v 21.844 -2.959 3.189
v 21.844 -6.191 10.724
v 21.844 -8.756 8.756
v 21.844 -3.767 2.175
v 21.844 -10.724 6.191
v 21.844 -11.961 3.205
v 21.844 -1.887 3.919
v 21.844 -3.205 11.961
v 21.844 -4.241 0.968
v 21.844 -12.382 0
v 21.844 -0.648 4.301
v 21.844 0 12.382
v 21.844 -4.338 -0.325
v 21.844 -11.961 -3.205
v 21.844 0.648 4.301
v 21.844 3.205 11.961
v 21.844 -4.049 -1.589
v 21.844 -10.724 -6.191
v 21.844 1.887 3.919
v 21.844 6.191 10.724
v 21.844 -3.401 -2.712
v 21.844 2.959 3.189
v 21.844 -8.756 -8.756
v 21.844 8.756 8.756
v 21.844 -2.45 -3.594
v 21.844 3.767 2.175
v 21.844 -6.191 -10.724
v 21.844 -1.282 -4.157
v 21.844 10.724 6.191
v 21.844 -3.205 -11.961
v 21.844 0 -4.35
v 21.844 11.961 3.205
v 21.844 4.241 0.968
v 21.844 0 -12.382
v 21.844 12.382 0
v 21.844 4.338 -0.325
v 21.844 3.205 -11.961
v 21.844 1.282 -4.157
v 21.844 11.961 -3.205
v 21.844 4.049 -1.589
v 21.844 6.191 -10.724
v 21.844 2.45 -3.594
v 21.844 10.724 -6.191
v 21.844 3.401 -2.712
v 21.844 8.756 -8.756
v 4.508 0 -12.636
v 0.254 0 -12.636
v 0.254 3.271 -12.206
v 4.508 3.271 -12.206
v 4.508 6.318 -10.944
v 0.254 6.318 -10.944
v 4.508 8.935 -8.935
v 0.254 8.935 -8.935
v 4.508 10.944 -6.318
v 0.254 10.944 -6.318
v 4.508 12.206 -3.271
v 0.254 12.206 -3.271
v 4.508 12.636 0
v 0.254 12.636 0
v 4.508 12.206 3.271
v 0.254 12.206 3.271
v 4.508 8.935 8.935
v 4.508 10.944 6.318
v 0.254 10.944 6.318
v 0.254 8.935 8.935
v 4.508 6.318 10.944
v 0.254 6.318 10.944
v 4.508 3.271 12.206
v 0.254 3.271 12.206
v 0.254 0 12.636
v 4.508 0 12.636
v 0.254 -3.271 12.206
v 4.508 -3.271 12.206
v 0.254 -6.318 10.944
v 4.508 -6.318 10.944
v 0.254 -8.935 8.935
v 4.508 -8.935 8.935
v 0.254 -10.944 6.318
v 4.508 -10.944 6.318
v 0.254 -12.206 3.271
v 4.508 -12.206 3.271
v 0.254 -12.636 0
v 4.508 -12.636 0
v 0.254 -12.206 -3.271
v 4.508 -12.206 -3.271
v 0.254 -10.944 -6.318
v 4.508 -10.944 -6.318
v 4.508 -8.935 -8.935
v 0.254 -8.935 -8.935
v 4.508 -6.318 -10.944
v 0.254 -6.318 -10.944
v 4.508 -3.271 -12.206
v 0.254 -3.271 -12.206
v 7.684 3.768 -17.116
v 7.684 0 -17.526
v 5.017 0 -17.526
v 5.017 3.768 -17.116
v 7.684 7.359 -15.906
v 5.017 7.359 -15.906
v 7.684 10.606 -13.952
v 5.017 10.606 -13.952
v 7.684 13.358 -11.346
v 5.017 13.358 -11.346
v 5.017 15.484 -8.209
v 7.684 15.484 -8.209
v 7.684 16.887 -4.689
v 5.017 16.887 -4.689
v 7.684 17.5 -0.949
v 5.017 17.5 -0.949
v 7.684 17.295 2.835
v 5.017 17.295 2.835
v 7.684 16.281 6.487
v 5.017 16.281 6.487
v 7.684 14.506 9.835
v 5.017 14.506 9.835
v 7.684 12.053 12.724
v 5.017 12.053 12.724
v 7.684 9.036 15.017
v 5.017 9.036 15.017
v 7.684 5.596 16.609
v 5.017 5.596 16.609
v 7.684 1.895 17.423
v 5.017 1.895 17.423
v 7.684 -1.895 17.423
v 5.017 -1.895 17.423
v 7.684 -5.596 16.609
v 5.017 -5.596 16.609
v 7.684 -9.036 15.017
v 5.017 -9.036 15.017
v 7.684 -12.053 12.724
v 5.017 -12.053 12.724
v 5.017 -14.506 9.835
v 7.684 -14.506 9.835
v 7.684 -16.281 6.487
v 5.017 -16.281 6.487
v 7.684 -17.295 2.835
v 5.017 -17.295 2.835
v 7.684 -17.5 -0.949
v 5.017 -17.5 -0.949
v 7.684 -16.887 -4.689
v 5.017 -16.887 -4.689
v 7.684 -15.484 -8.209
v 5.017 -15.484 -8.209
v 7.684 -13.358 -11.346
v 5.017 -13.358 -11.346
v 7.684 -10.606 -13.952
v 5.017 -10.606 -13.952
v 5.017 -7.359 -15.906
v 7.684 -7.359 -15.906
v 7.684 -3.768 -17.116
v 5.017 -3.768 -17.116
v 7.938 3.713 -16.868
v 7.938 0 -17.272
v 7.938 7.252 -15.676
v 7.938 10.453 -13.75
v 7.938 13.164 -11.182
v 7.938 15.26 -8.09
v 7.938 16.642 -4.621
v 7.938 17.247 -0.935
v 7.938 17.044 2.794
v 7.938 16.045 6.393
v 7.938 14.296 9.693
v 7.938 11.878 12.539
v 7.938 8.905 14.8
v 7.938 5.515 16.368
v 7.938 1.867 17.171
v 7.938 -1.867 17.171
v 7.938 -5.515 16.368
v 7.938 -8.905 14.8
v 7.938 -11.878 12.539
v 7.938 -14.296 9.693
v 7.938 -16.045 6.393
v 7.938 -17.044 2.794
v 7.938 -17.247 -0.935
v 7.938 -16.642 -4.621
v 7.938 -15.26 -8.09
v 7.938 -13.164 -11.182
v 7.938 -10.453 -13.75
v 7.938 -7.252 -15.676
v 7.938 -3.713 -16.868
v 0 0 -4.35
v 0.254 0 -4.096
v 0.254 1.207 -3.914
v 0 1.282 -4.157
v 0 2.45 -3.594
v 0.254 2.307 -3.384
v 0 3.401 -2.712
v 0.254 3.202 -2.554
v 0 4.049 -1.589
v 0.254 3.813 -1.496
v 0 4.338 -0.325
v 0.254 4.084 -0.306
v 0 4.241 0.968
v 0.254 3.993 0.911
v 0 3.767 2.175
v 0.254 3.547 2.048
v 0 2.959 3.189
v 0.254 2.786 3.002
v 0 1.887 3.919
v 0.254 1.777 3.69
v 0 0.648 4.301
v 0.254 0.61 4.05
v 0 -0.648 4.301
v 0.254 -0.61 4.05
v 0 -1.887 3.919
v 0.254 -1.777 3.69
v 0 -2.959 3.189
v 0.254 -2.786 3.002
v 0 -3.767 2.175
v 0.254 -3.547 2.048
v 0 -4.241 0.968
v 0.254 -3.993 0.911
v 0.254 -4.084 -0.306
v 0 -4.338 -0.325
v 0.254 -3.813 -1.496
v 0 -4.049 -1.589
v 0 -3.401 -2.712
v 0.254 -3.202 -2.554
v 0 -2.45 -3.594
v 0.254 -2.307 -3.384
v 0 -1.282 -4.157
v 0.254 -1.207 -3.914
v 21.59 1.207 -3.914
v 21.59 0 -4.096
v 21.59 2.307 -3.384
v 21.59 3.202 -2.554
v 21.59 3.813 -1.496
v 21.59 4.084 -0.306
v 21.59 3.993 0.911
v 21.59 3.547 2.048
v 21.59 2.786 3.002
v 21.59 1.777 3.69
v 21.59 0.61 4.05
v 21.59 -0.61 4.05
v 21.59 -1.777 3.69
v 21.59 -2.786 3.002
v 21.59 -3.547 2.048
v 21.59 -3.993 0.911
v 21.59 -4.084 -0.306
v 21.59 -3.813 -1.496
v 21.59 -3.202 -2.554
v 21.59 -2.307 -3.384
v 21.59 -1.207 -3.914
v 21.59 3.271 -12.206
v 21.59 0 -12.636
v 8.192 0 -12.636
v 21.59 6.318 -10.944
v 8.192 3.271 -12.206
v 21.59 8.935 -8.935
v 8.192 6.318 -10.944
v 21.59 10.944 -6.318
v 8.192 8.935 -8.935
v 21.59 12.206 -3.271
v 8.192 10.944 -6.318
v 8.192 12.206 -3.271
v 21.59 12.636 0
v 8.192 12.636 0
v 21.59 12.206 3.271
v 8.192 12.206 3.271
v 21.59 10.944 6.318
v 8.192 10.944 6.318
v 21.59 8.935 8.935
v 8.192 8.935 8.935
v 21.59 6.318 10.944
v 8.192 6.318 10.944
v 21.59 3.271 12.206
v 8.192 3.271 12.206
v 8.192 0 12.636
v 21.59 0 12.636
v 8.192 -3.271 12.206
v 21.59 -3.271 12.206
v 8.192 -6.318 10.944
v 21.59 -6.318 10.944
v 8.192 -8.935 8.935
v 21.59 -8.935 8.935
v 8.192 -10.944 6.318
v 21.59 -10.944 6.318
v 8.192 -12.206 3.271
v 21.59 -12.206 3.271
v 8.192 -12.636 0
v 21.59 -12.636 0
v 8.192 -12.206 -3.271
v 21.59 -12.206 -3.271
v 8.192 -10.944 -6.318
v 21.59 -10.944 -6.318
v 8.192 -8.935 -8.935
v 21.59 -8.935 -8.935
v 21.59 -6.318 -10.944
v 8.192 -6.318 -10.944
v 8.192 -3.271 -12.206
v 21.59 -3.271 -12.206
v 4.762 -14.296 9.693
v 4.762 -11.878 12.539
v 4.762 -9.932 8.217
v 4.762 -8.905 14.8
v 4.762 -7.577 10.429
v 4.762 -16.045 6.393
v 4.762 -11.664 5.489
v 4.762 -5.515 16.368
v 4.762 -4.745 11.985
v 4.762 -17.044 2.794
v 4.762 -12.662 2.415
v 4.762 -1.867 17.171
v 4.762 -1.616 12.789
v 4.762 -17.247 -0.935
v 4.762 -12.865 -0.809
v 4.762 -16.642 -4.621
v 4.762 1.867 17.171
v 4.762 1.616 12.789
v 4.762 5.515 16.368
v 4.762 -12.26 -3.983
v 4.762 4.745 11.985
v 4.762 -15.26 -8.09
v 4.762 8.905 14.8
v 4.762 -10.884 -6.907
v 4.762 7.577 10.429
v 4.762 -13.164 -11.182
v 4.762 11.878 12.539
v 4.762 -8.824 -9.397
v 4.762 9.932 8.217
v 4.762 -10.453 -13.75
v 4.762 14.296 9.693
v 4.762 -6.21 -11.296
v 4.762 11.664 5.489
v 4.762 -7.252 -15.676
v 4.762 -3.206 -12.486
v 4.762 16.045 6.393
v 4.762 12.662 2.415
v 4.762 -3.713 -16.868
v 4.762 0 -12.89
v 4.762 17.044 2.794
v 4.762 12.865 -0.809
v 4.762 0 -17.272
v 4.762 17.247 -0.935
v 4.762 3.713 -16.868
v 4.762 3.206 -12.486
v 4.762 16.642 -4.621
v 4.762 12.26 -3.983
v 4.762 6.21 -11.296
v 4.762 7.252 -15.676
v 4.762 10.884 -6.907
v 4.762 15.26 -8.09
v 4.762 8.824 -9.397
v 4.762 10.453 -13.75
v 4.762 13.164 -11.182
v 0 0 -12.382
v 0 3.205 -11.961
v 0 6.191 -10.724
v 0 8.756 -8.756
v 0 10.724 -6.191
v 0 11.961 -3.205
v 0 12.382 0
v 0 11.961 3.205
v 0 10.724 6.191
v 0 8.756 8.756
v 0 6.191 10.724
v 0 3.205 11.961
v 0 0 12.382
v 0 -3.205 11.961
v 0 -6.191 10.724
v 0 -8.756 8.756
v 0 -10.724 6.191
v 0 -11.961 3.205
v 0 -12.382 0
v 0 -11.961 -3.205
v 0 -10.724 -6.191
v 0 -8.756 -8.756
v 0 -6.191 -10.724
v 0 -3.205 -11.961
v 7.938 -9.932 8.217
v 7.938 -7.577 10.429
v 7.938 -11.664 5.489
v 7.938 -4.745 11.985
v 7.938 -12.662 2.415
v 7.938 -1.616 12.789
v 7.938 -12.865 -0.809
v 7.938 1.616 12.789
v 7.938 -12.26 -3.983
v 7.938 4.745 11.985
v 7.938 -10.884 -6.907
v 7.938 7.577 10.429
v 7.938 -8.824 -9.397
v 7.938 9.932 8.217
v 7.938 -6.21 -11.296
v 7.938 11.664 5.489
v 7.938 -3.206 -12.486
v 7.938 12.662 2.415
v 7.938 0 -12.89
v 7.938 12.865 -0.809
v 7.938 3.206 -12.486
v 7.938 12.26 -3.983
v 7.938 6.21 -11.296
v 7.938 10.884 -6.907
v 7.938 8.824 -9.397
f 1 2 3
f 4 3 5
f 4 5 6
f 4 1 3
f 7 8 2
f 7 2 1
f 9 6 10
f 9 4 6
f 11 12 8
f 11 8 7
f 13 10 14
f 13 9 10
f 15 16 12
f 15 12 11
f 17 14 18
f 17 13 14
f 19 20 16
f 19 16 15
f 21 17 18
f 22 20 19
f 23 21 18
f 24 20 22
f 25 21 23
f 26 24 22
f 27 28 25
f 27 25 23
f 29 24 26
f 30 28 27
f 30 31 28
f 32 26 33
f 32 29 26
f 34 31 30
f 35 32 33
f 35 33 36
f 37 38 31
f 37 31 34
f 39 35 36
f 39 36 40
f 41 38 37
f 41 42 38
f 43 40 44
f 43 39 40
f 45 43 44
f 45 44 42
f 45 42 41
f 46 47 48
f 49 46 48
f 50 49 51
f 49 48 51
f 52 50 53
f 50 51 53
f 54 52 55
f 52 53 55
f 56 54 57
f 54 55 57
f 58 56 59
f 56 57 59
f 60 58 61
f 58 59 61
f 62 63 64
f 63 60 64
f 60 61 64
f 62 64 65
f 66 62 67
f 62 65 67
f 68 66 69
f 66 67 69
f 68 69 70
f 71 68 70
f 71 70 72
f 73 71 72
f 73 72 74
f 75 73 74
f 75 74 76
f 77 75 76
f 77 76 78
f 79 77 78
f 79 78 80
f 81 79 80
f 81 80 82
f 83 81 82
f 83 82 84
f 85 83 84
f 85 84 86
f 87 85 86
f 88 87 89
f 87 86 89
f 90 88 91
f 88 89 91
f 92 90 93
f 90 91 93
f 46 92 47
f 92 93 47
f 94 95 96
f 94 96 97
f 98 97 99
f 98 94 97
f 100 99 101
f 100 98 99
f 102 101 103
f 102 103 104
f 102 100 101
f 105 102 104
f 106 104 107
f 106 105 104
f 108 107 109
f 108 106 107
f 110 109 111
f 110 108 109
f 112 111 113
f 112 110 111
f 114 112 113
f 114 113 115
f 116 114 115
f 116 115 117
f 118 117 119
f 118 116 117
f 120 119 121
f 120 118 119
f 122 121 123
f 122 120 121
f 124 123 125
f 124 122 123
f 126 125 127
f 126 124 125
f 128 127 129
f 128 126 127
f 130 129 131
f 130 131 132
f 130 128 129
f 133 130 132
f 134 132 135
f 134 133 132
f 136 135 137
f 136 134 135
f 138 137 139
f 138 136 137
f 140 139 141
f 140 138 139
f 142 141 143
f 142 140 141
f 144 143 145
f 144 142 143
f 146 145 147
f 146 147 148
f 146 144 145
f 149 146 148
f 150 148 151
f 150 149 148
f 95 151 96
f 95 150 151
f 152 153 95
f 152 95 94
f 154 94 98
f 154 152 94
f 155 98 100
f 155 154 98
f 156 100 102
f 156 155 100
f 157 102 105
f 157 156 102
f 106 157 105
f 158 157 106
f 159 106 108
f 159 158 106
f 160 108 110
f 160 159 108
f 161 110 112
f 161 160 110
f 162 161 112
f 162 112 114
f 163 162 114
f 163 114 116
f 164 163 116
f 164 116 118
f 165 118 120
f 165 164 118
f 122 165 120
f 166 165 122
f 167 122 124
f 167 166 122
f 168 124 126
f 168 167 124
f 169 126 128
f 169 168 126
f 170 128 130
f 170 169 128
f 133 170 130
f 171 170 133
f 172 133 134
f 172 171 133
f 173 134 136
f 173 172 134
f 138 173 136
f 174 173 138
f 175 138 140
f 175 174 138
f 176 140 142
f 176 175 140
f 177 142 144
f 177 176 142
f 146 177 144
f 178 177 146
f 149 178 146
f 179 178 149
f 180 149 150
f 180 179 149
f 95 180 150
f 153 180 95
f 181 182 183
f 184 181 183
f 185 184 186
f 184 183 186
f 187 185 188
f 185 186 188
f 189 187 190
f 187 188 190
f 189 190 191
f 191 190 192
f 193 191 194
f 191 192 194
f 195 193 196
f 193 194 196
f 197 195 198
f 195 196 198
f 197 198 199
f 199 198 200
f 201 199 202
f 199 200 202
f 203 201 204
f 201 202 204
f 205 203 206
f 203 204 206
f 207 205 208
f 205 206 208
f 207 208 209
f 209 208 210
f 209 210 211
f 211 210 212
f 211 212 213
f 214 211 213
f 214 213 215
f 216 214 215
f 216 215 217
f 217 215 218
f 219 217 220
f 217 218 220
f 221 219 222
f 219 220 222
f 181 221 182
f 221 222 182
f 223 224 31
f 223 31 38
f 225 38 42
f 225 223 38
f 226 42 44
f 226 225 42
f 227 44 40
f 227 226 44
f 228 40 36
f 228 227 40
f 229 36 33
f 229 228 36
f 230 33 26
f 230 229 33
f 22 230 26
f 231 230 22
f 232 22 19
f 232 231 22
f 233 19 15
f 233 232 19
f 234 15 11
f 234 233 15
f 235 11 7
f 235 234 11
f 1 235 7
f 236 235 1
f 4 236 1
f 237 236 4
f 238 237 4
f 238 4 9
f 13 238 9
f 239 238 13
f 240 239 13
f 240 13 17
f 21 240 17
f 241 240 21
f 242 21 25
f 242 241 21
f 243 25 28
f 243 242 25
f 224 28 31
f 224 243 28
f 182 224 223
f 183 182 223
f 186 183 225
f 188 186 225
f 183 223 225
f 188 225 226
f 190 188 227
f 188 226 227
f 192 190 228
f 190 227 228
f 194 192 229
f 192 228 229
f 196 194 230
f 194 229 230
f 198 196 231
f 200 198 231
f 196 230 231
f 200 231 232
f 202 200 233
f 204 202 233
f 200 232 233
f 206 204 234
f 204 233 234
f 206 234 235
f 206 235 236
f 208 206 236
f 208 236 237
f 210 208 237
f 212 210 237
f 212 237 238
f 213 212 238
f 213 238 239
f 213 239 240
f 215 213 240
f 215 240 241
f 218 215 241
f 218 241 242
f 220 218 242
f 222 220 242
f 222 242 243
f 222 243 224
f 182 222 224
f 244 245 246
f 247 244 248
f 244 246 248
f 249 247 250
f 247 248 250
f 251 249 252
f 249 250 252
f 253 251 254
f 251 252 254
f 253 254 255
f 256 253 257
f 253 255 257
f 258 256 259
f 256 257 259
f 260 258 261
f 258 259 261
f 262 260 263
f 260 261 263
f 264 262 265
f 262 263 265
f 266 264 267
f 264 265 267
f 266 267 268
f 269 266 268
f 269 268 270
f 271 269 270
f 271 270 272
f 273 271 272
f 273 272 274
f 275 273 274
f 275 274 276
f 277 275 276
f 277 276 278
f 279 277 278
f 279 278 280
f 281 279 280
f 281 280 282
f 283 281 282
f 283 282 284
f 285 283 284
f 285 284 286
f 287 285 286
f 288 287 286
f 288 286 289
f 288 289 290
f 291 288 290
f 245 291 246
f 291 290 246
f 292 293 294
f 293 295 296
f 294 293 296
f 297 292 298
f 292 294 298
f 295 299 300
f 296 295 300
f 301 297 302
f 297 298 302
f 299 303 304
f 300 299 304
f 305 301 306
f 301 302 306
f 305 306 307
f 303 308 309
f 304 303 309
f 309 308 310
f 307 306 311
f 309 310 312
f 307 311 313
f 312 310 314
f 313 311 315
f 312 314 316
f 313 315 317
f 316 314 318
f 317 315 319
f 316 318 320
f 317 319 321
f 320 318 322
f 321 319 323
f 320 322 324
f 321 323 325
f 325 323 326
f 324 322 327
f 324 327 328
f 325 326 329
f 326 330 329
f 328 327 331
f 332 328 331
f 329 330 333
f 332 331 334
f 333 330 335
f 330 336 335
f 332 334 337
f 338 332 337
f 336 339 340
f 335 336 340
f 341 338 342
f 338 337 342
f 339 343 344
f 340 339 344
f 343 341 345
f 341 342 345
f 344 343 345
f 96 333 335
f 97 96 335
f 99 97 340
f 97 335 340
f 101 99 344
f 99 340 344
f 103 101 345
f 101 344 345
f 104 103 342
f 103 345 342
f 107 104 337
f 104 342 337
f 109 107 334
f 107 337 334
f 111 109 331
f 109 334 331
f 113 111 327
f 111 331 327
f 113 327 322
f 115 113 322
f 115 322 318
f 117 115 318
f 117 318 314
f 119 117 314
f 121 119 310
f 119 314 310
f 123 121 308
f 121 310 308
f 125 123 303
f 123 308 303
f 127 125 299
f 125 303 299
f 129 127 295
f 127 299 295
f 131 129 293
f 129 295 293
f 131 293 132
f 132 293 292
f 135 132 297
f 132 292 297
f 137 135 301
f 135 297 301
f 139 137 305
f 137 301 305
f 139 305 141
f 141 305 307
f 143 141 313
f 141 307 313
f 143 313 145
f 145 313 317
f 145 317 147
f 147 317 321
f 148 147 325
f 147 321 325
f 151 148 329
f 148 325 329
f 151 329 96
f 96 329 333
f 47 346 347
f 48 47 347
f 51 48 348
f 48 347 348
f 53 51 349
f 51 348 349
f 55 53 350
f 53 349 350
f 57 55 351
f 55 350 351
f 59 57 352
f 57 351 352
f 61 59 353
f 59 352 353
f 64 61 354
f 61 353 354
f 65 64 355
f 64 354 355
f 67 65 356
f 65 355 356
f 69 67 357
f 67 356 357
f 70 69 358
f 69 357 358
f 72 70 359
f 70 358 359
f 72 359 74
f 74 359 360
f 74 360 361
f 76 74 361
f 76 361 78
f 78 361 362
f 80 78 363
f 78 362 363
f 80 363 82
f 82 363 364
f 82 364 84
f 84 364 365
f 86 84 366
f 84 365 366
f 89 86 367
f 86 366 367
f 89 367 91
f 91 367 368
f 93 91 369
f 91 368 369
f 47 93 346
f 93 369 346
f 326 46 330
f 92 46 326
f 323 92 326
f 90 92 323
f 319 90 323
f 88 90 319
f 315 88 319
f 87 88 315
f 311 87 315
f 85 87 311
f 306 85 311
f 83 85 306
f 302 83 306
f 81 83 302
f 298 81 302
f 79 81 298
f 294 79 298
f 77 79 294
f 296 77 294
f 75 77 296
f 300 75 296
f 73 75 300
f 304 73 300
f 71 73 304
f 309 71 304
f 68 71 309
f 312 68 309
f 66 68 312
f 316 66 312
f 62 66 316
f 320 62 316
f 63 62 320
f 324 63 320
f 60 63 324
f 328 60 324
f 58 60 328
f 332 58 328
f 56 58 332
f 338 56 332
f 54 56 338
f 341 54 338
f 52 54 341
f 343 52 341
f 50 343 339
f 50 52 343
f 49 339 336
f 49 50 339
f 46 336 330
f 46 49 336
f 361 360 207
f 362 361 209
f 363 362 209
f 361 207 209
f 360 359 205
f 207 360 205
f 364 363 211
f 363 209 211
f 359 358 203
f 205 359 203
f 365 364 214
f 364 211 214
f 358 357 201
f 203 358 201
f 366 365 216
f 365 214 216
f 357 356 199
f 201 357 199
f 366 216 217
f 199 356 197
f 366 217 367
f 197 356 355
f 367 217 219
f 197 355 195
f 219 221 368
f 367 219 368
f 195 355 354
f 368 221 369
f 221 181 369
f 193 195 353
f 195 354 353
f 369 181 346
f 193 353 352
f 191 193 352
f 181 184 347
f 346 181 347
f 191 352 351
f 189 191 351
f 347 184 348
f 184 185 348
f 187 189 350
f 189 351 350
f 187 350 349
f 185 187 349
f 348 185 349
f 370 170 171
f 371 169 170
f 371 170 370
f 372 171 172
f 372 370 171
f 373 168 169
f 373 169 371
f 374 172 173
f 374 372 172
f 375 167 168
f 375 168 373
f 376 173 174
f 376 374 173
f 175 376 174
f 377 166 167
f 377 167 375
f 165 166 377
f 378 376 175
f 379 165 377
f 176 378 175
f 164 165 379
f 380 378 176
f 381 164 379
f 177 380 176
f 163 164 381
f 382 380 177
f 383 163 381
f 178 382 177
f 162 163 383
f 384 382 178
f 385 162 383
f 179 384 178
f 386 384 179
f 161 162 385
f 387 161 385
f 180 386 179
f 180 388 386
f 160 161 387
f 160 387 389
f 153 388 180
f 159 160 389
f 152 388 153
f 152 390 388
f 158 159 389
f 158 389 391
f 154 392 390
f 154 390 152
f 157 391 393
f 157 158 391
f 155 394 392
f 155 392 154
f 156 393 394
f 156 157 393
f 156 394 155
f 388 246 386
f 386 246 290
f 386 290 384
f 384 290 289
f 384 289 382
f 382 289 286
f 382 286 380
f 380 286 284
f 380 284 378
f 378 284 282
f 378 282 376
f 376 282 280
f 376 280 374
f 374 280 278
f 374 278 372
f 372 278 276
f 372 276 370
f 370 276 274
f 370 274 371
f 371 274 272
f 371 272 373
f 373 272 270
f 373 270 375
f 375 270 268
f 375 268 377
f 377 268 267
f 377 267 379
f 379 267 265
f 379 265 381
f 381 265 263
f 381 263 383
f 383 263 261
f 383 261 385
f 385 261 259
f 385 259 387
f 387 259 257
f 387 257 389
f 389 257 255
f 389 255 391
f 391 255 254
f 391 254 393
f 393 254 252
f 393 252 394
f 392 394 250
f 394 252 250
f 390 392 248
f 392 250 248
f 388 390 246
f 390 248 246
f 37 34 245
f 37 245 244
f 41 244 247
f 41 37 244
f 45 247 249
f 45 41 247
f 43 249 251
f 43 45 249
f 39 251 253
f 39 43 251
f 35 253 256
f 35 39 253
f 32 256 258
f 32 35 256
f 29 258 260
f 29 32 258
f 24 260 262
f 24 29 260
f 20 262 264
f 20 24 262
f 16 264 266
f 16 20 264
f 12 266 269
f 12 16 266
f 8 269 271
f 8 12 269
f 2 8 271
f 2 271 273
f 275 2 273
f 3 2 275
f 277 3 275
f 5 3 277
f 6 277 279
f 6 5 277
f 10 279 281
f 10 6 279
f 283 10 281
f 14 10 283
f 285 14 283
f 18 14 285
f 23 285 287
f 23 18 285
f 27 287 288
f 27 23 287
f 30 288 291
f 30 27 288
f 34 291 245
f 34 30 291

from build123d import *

# Parameters (mm, degrees)
SKETCH1_R           = 12.6365
BOSS_EXTRUDE1_DEPTH = 21.844
SKETCH2_R           = 17.526
BOSS_EXTRUDE2_DEPTH = 3.175
CHAMFER1_SIZE       = 0.254
SKETCH3_R           = 4.09575
CUT_EXTRUDE1_DEPTH  = 34.037579936
CHAMFER2_SIZE       = 0.254


with BuildPart() as part:
    # Sketch1 → Boss-Extrude1 (new body)
    with BuildSketch(Plane(origin=(0, 0, 0), x_dir=(0, 0, -1), z_dir=(1, 0, 0))):
        Circle(SKETCH1_R)
    extrude(amount=BOSS_EXTRUDE1_DEPTH)

    # Sketch2 → Boss-Extrude2 (add)
    with BuildSketch(Plane(origin=(7.9375, 0, 0), x_dir=(0, 0, -1), z_dir=(1, 0, 0))):
        Circle(SKETCH2_R)
    extrude(amount=-BOSS_EXTRUDE2_DEPTH)

    # Chamfer1
    chamfer1_edges = [part.edges().sort_by_distance(p)[0] for p in [
        (0, 0, 12.6365),
        (21.844, 0, 12.6365),
        (4.7625, 0, 12.6365),
        (7.9375, 0, 12.6365),
        (4.7625, 0, 17.526),
        (7.9375, 0, 17.526),
    ]]
    chamfer(chamfer1_edges, length=CHAMFER1_SIZE)

    # Sketch3 → Cut-Extrude1 (cut, through all)
    with BuildSketch(Plane(origin=(21.844, 0, 0), x_dir=(0, 0, -1), z_dir=(1, 0, 0))):
        Circle(SKETCH3_R)
    extrude(amount=-CUT_EXTRUDE1_DEPTH, mode=Mode.SUBTRACT)

    # Chamfer2
    chamfer2_edges = [part.edges().sort_by_distance(p)[0] for p in [
        (0, 0, 4.09575),
        (21.844, 0, 4.09575),
    ]]
    chamfer(chamfer2_edges, length=CHAMFER2_SIZE)


solid = part.part
